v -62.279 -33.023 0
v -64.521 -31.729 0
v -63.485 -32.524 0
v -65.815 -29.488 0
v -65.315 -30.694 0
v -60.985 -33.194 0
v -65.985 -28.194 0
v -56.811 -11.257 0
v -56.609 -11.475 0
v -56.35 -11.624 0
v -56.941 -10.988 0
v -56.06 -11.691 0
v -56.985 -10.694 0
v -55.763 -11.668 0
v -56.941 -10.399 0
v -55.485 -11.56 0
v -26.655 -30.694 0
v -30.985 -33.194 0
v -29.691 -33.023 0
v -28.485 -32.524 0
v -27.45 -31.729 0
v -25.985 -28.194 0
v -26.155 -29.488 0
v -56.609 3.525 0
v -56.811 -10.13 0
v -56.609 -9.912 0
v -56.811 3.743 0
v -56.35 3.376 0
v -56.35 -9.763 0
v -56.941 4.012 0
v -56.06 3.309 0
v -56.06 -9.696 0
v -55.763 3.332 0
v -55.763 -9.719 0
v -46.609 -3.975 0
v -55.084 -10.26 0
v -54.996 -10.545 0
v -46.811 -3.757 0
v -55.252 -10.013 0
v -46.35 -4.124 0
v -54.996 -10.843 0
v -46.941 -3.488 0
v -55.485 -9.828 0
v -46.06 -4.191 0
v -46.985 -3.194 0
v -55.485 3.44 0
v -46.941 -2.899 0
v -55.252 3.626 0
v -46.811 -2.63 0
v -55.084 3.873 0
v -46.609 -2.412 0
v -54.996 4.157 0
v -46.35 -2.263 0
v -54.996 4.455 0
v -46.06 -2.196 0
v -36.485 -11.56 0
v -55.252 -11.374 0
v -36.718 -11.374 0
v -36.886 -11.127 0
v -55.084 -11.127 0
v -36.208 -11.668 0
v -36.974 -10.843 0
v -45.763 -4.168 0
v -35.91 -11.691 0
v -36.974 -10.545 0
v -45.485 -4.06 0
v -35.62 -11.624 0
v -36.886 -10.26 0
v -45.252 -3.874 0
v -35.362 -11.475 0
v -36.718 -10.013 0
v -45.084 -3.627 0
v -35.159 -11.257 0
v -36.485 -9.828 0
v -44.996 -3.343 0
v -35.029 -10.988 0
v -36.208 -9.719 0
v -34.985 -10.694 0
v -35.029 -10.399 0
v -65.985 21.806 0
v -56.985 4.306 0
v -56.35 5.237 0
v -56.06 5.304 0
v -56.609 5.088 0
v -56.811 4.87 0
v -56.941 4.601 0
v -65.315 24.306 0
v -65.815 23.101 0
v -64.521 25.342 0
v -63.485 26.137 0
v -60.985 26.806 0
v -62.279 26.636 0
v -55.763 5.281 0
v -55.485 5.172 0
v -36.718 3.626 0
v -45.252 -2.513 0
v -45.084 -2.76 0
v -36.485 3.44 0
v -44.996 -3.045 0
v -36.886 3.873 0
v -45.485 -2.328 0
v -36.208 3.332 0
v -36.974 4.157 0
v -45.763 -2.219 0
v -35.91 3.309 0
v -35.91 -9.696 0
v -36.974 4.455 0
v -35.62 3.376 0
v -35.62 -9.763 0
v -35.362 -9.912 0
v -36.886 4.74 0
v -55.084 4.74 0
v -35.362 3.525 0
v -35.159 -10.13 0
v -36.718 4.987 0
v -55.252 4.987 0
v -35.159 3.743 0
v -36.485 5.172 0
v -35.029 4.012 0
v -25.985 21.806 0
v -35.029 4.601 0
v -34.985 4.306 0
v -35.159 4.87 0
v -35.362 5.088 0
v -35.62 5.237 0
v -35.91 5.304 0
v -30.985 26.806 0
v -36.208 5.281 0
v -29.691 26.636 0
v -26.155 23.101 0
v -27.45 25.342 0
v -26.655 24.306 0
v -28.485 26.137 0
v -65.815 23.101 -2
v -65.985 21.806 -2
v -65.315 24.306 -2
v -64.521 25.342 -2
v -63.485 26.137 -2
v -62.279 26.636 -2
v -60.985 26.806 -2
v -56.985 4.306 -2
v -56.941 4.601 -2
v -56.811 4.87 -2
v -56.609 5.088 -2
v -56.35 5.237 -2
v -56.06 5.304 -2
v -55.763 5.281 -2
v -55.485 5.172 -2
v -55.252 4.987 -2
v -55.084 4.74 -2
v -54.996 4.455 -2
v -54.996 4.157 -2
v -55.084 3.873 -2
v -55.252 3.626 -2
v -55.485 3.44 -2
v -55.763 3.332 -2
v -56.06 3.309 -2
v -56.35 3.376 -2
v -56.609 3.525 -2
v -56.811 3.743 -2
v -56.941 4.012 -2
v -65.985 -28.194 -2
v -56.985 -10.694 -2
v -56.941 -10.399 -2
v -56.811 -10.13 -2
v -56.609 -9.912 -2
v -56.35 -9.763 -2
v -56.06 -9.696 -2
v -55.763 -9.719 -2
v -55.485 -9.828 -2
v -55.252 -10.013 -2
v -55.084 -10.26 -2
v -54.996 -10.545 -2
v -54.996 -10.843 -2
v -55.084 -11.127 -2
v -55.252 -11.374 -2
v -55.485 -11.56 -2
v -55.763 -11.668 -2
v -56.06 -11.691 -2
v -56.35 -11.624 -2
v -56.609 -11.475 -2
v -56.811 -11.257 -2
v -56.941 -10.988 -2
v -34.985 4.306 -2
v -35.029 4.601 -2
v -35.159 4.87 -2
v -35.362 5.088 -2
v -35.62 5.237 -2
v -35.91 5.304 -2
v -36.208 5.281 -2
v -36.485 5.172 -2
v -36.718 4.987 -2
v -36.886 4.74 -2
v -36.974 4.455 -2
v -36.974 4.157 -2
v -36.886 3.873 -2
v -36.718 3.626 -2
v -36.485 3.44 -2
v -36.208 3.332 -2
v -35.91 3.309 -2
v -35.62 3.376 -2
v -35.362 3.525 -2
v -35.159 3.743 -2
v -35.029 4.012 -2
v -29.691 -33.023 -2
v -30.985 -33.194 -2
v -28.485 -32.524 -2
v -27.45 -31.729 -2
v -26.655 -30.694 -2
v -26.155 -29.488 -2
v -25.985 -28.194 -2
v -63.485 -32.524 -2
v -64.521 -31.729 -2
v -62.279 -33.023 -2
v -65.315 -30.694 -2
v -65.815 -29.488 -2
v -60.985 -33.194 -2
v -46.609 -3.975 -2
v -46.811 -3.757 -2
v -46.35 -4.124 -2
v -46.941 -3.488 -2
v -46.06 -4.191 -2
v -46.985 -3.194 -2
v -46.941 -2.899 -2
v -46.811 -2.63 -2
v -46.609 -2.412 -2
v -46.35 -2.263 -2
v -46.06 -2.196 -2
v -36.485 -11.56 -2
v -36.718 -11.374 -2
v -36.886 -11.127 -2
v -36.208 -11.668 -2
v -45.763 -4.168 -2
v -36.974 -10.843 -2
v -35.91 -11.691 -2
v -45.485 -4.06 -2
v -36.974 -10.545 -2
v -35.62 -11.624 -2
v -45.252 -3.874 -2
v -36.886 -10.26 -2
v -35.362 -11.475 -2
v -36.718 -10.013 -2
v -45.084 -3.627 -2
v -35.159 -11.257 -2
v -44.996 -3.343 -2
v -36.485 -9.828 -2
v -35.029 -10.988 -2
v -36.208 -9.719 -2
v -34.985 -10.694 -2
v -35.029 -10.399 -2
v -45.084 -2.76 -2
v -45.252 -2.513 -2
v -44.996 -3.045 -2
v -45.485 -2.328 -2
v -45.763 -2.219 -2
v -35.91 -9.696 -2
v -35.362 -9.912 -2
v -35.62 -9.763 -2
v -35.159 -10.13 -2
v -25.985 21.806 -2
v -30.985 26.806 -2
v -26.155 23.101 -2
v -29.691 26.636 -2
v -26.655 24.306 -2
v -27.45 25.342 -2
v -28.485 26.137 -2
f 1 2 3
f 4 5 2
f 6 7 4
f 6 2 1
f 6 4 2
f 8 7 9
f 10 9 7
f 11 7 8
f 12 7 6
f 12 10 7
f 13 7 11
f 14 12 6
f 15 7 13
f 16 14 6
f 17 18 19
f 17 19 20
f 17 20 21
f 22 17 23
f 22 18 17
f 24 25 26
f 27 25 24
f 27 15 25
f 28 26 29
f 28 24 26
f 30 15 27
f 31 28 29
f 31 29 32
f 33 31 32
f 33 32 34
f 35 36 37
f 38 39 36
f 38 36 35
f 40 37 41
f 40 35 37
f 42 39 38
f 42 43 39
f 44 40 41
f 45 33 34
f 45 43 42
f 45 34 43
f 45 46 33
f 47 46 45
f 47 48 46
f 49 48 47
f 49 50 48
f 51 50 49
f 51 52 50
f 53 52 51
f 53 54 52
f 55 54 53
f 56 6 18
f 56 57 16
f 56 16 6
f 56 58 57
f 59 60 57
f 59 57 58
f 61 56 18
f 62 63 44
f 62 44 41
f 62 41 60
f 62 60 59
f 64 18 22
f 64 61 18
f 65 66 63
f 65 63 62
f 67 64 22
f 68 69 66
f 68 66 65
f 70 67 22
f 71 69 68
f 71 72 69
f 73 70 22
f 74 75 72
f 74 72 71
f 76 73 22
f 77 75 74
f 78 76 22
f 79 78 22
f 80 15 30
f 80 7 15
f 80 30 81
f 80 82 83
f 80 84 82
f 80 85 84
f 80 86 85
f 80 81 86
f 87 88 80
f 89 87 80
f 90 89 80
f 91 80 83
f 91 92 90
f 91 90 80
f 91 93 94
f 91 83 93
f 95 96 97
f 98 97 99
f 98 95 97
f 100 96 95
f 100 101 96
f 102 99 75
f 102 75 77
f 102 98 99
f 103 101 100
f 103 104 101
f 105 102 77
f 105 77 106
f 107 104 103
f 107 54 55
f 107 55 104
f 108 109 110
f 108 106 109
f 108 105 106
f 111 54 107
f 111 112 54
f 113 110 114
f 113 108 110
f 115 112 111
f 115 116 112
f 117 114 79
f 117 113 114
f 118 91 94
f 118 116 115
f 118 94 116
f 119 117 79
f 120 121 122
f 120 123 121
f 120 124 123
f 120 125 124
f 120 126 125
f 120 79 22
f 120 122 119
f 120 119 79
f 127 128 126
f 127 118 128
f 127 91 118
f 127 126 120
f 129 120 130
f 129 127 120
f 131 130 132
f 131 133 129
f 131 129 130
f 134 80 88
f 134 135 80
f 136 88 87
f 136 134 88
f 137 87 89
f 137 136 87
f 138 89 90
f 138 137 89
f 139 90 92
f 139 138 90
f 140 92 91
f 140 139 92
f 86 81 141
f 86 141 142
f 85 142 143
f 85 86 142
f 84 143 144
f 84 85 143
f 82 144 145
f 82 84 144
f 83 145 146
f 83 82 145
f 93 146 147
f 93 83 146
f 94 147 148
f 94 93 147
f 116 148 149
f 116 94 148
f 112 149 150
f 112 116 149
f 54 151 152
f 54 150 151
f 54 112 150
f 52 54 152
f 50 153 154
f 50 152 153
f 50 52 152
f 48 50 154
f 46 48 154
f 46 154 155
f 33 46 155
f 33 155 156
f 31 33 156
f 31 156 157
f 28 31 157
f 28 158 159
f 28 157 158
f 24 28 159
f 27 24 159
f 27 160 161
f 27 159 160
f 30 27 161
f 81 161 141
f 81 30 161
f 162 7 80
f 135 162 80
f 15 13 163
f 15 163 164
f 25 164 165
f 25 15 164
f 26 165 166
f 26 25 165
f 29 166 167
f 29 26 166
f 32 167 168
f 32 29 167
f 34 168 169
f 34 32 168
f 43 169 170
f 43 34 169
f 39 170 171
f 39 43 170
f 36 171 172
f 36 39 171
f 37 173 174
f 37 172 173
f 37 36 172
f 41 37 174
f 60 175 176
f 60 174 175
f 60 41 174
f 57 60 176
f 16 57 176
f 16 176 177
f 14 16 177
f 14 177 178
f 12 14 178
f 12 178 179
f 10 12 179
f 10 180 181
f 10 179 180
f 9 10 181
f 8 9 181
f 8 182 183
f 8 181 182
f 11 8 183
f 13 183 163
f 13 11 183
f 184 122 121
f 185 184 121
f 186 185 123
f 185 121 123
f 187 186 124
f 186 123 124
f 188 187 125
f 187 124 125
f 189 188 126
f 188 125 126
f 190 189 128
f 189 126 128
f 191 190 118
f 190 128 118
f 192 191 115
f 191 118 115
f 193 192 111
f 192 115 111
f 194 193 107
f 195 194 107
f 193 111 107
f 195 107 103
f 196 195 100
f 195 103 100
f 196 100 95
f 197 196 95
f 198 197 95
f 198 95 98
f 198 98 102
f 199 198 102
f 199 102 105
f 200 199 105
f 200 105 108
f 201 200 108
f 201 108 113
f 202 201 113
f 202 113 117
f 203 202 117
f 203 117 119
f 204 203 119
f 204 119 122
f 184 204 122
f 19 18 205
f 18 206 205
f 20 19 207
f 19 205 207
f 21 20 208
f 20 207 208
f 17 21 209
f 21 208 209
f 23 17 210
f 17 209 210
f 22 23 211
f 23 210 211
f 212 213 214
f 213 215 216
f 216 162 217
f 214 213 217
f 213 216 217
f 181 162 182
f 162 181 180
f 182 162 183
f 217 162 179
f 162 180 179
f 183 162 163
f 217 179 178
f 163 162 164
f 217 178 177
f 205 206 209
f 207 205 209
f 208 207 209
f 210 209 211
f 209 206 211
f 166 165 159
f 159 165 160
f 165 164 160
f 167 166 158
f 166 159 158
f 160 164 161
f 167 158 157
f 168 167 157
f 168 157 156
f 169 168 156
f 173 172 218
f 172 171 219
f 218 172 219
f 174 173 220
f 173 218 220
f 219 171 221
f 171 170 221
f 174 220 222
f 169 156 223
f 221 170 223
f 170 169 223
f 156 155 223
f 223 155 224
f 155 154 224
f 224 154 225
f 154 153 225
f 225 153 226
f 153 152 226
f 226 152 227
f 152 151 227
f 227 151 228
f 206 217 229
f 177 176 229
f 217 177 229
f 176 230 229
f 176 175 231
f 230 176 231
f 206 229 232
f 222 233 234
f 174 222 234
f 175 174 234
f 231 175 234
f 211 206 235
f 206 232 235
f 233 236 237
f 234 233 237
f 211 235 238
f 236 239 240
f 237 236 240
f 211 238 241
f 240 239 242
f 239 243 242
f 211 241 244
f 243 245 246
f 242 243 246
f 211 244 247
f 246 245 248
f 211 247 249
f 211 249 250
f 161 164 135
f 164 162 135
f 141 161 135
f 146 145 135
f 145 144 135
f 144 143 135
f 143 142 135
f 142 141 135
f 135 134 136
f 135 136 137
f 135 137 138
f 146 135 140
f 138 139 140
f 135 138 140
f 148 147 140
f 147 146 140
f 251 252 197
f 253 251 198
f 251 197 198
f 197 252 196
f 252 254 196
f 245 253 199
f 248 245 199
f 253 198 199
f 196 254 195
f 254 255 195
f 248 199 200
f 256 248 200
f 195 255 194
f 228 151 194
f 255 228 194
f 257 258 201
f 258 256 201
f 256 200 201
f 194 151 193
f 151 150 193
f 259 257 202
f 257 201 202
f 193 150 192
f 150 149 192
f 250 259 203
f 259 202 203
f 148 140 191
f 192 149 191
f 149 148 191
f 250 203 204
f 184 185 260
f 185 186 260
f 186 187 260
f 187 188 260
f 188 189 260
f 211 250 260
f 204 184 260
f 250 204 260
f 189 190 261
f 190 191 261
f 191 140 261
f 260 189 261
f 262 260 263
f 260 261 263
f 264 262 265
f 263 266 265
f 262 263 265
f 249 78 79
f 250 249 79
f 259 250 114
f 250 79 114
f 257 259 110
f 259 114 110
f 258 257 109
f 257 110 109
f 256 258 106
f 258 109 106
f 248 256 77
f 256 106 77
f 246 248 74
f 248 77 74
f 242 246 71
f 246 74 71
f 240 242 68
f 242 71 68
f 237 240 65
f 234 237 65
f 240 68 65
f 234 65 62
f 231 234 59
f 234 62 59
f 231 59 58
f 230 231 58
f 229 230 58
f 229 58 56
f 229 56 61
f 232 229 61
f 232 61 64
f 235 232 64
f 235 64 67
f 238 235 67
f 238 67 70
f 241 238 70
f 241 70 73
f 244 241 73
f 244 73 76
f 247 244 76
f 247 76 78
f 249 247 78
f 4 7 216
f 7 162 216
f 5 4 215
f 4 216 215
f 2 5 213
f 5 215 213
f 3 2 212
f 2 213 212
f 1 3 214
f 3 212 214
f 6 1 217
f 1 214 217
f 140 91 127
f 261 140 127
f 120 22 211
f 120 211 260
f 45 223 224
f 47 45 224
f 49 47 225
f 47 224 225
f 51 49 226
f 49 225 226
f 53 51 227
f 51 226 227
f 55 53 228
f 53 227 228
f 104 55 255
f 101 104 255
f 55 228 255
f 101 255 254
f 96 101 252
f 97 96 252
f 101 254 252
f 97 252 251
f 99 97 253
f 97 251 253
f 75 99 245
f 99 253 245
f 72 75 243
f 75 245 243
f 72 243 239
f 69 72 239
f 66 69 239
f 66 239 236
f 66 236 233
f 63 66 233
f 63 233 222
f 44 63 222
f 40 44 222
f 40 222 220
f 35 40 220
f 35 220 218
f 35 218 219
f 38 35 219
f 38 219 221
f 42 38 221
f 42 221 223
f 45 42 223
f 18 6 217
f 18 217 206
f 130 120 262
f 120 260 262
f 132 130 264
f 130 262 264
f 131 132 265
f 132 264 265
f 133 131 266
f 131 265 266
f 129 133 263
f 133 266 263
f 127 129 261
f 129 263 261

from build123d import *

# Parameters (mm, degrees)
SKETCH1_W               = 40
SKETCH1_H               = 60
BOSS_EXTRUDE4_DEPTH     = 2
FILLET1_R               = 5
SKETCH12_R              = 1
CUT_EXTRUDE6_DEPTH      = 12
CUT_EXTRUDE7_DEPTH      = 8
CUT_EXTRUDE7_DEPTH_BACK = 10
SKETCH13_R              = 1
SKETCH14_R              = 1
CUT_EXTRUDE8_DEPTH      = 10


with BuildPart() as part:
    # Sketch1 → Boss-Extrude4 (new body)
    with BuildSketch(Plane.XY):
        with Locations((-45.9850693, -3.193565597)):
            Rectangle(SKETCH1_W, SKETCH1_H)
    extrude(amount=-BOSS_EXTRUDE4_DEPTH)

    # Fillet1
    fillet1_edges = [part.edges().sort_by_distance(p)[0] for p in [
        (-65.9850693, 26.806434403, -1),
        (-65.9850693, -33.193565597, -1),
        (-25.9850693, -33.193565597, -1),
        (-25.9850693, 26.806434403, -1),
    ]]
    fillet(fillet1_edges, radius=FILLET1_R)

    # Sketch12 → Cut-Extrude6 (cut)
    with BuildSketch(Plane(origin=(0, 0, -2), x_dir=(-1, 0, 0), z_dir=(0, 0, -1))):
        with Locations((45.9850693, -3.193565597)):
            Circle(SKETCH12_R)
    extrude(amount=-CUT_EXTRUDE6_DEPTH, mode=Mode.SUBTRACT)

    # Sketch13 → Cut-Extrude7 (cut, two sides: drawn at the far end of the back side and taken through both)
    with BuildSketch(Plane(origin=(0, 0, -2), x_dir=(-1, 0, 0), z_dir=(0, 0, -1)).offset(-CUT_EXTRUDE7_DEPTH_BACK)):
        with Locations((55.9850693, 4.306434403)):
            Circle(SKETCH13_R)
        with Locations((55.9850693, -10.693565597)):
            Circle(SKETCH13_R)
    extrude(amount=CUT_EXTRUDE7_DEPTH + CUT_EXTRUDE7_DEPTH_BACK, mode=Mode.SUBTRACT)

    # Sketch14 → Cut-Extrude8 (cut)
    with BuildSketch(Plane.XY):
        with Locations((-35.9850693, 4.306434403)):
            Circle(SKETCH14_R)
        with Locations((-35.9850693, -10.693565597)):
            Circle(SKETCH14_R)
    extrude(amount=-CUT_EXTRUDE8_DEPTH, mode=Mode.SUBTRACT)


solid = part.part
